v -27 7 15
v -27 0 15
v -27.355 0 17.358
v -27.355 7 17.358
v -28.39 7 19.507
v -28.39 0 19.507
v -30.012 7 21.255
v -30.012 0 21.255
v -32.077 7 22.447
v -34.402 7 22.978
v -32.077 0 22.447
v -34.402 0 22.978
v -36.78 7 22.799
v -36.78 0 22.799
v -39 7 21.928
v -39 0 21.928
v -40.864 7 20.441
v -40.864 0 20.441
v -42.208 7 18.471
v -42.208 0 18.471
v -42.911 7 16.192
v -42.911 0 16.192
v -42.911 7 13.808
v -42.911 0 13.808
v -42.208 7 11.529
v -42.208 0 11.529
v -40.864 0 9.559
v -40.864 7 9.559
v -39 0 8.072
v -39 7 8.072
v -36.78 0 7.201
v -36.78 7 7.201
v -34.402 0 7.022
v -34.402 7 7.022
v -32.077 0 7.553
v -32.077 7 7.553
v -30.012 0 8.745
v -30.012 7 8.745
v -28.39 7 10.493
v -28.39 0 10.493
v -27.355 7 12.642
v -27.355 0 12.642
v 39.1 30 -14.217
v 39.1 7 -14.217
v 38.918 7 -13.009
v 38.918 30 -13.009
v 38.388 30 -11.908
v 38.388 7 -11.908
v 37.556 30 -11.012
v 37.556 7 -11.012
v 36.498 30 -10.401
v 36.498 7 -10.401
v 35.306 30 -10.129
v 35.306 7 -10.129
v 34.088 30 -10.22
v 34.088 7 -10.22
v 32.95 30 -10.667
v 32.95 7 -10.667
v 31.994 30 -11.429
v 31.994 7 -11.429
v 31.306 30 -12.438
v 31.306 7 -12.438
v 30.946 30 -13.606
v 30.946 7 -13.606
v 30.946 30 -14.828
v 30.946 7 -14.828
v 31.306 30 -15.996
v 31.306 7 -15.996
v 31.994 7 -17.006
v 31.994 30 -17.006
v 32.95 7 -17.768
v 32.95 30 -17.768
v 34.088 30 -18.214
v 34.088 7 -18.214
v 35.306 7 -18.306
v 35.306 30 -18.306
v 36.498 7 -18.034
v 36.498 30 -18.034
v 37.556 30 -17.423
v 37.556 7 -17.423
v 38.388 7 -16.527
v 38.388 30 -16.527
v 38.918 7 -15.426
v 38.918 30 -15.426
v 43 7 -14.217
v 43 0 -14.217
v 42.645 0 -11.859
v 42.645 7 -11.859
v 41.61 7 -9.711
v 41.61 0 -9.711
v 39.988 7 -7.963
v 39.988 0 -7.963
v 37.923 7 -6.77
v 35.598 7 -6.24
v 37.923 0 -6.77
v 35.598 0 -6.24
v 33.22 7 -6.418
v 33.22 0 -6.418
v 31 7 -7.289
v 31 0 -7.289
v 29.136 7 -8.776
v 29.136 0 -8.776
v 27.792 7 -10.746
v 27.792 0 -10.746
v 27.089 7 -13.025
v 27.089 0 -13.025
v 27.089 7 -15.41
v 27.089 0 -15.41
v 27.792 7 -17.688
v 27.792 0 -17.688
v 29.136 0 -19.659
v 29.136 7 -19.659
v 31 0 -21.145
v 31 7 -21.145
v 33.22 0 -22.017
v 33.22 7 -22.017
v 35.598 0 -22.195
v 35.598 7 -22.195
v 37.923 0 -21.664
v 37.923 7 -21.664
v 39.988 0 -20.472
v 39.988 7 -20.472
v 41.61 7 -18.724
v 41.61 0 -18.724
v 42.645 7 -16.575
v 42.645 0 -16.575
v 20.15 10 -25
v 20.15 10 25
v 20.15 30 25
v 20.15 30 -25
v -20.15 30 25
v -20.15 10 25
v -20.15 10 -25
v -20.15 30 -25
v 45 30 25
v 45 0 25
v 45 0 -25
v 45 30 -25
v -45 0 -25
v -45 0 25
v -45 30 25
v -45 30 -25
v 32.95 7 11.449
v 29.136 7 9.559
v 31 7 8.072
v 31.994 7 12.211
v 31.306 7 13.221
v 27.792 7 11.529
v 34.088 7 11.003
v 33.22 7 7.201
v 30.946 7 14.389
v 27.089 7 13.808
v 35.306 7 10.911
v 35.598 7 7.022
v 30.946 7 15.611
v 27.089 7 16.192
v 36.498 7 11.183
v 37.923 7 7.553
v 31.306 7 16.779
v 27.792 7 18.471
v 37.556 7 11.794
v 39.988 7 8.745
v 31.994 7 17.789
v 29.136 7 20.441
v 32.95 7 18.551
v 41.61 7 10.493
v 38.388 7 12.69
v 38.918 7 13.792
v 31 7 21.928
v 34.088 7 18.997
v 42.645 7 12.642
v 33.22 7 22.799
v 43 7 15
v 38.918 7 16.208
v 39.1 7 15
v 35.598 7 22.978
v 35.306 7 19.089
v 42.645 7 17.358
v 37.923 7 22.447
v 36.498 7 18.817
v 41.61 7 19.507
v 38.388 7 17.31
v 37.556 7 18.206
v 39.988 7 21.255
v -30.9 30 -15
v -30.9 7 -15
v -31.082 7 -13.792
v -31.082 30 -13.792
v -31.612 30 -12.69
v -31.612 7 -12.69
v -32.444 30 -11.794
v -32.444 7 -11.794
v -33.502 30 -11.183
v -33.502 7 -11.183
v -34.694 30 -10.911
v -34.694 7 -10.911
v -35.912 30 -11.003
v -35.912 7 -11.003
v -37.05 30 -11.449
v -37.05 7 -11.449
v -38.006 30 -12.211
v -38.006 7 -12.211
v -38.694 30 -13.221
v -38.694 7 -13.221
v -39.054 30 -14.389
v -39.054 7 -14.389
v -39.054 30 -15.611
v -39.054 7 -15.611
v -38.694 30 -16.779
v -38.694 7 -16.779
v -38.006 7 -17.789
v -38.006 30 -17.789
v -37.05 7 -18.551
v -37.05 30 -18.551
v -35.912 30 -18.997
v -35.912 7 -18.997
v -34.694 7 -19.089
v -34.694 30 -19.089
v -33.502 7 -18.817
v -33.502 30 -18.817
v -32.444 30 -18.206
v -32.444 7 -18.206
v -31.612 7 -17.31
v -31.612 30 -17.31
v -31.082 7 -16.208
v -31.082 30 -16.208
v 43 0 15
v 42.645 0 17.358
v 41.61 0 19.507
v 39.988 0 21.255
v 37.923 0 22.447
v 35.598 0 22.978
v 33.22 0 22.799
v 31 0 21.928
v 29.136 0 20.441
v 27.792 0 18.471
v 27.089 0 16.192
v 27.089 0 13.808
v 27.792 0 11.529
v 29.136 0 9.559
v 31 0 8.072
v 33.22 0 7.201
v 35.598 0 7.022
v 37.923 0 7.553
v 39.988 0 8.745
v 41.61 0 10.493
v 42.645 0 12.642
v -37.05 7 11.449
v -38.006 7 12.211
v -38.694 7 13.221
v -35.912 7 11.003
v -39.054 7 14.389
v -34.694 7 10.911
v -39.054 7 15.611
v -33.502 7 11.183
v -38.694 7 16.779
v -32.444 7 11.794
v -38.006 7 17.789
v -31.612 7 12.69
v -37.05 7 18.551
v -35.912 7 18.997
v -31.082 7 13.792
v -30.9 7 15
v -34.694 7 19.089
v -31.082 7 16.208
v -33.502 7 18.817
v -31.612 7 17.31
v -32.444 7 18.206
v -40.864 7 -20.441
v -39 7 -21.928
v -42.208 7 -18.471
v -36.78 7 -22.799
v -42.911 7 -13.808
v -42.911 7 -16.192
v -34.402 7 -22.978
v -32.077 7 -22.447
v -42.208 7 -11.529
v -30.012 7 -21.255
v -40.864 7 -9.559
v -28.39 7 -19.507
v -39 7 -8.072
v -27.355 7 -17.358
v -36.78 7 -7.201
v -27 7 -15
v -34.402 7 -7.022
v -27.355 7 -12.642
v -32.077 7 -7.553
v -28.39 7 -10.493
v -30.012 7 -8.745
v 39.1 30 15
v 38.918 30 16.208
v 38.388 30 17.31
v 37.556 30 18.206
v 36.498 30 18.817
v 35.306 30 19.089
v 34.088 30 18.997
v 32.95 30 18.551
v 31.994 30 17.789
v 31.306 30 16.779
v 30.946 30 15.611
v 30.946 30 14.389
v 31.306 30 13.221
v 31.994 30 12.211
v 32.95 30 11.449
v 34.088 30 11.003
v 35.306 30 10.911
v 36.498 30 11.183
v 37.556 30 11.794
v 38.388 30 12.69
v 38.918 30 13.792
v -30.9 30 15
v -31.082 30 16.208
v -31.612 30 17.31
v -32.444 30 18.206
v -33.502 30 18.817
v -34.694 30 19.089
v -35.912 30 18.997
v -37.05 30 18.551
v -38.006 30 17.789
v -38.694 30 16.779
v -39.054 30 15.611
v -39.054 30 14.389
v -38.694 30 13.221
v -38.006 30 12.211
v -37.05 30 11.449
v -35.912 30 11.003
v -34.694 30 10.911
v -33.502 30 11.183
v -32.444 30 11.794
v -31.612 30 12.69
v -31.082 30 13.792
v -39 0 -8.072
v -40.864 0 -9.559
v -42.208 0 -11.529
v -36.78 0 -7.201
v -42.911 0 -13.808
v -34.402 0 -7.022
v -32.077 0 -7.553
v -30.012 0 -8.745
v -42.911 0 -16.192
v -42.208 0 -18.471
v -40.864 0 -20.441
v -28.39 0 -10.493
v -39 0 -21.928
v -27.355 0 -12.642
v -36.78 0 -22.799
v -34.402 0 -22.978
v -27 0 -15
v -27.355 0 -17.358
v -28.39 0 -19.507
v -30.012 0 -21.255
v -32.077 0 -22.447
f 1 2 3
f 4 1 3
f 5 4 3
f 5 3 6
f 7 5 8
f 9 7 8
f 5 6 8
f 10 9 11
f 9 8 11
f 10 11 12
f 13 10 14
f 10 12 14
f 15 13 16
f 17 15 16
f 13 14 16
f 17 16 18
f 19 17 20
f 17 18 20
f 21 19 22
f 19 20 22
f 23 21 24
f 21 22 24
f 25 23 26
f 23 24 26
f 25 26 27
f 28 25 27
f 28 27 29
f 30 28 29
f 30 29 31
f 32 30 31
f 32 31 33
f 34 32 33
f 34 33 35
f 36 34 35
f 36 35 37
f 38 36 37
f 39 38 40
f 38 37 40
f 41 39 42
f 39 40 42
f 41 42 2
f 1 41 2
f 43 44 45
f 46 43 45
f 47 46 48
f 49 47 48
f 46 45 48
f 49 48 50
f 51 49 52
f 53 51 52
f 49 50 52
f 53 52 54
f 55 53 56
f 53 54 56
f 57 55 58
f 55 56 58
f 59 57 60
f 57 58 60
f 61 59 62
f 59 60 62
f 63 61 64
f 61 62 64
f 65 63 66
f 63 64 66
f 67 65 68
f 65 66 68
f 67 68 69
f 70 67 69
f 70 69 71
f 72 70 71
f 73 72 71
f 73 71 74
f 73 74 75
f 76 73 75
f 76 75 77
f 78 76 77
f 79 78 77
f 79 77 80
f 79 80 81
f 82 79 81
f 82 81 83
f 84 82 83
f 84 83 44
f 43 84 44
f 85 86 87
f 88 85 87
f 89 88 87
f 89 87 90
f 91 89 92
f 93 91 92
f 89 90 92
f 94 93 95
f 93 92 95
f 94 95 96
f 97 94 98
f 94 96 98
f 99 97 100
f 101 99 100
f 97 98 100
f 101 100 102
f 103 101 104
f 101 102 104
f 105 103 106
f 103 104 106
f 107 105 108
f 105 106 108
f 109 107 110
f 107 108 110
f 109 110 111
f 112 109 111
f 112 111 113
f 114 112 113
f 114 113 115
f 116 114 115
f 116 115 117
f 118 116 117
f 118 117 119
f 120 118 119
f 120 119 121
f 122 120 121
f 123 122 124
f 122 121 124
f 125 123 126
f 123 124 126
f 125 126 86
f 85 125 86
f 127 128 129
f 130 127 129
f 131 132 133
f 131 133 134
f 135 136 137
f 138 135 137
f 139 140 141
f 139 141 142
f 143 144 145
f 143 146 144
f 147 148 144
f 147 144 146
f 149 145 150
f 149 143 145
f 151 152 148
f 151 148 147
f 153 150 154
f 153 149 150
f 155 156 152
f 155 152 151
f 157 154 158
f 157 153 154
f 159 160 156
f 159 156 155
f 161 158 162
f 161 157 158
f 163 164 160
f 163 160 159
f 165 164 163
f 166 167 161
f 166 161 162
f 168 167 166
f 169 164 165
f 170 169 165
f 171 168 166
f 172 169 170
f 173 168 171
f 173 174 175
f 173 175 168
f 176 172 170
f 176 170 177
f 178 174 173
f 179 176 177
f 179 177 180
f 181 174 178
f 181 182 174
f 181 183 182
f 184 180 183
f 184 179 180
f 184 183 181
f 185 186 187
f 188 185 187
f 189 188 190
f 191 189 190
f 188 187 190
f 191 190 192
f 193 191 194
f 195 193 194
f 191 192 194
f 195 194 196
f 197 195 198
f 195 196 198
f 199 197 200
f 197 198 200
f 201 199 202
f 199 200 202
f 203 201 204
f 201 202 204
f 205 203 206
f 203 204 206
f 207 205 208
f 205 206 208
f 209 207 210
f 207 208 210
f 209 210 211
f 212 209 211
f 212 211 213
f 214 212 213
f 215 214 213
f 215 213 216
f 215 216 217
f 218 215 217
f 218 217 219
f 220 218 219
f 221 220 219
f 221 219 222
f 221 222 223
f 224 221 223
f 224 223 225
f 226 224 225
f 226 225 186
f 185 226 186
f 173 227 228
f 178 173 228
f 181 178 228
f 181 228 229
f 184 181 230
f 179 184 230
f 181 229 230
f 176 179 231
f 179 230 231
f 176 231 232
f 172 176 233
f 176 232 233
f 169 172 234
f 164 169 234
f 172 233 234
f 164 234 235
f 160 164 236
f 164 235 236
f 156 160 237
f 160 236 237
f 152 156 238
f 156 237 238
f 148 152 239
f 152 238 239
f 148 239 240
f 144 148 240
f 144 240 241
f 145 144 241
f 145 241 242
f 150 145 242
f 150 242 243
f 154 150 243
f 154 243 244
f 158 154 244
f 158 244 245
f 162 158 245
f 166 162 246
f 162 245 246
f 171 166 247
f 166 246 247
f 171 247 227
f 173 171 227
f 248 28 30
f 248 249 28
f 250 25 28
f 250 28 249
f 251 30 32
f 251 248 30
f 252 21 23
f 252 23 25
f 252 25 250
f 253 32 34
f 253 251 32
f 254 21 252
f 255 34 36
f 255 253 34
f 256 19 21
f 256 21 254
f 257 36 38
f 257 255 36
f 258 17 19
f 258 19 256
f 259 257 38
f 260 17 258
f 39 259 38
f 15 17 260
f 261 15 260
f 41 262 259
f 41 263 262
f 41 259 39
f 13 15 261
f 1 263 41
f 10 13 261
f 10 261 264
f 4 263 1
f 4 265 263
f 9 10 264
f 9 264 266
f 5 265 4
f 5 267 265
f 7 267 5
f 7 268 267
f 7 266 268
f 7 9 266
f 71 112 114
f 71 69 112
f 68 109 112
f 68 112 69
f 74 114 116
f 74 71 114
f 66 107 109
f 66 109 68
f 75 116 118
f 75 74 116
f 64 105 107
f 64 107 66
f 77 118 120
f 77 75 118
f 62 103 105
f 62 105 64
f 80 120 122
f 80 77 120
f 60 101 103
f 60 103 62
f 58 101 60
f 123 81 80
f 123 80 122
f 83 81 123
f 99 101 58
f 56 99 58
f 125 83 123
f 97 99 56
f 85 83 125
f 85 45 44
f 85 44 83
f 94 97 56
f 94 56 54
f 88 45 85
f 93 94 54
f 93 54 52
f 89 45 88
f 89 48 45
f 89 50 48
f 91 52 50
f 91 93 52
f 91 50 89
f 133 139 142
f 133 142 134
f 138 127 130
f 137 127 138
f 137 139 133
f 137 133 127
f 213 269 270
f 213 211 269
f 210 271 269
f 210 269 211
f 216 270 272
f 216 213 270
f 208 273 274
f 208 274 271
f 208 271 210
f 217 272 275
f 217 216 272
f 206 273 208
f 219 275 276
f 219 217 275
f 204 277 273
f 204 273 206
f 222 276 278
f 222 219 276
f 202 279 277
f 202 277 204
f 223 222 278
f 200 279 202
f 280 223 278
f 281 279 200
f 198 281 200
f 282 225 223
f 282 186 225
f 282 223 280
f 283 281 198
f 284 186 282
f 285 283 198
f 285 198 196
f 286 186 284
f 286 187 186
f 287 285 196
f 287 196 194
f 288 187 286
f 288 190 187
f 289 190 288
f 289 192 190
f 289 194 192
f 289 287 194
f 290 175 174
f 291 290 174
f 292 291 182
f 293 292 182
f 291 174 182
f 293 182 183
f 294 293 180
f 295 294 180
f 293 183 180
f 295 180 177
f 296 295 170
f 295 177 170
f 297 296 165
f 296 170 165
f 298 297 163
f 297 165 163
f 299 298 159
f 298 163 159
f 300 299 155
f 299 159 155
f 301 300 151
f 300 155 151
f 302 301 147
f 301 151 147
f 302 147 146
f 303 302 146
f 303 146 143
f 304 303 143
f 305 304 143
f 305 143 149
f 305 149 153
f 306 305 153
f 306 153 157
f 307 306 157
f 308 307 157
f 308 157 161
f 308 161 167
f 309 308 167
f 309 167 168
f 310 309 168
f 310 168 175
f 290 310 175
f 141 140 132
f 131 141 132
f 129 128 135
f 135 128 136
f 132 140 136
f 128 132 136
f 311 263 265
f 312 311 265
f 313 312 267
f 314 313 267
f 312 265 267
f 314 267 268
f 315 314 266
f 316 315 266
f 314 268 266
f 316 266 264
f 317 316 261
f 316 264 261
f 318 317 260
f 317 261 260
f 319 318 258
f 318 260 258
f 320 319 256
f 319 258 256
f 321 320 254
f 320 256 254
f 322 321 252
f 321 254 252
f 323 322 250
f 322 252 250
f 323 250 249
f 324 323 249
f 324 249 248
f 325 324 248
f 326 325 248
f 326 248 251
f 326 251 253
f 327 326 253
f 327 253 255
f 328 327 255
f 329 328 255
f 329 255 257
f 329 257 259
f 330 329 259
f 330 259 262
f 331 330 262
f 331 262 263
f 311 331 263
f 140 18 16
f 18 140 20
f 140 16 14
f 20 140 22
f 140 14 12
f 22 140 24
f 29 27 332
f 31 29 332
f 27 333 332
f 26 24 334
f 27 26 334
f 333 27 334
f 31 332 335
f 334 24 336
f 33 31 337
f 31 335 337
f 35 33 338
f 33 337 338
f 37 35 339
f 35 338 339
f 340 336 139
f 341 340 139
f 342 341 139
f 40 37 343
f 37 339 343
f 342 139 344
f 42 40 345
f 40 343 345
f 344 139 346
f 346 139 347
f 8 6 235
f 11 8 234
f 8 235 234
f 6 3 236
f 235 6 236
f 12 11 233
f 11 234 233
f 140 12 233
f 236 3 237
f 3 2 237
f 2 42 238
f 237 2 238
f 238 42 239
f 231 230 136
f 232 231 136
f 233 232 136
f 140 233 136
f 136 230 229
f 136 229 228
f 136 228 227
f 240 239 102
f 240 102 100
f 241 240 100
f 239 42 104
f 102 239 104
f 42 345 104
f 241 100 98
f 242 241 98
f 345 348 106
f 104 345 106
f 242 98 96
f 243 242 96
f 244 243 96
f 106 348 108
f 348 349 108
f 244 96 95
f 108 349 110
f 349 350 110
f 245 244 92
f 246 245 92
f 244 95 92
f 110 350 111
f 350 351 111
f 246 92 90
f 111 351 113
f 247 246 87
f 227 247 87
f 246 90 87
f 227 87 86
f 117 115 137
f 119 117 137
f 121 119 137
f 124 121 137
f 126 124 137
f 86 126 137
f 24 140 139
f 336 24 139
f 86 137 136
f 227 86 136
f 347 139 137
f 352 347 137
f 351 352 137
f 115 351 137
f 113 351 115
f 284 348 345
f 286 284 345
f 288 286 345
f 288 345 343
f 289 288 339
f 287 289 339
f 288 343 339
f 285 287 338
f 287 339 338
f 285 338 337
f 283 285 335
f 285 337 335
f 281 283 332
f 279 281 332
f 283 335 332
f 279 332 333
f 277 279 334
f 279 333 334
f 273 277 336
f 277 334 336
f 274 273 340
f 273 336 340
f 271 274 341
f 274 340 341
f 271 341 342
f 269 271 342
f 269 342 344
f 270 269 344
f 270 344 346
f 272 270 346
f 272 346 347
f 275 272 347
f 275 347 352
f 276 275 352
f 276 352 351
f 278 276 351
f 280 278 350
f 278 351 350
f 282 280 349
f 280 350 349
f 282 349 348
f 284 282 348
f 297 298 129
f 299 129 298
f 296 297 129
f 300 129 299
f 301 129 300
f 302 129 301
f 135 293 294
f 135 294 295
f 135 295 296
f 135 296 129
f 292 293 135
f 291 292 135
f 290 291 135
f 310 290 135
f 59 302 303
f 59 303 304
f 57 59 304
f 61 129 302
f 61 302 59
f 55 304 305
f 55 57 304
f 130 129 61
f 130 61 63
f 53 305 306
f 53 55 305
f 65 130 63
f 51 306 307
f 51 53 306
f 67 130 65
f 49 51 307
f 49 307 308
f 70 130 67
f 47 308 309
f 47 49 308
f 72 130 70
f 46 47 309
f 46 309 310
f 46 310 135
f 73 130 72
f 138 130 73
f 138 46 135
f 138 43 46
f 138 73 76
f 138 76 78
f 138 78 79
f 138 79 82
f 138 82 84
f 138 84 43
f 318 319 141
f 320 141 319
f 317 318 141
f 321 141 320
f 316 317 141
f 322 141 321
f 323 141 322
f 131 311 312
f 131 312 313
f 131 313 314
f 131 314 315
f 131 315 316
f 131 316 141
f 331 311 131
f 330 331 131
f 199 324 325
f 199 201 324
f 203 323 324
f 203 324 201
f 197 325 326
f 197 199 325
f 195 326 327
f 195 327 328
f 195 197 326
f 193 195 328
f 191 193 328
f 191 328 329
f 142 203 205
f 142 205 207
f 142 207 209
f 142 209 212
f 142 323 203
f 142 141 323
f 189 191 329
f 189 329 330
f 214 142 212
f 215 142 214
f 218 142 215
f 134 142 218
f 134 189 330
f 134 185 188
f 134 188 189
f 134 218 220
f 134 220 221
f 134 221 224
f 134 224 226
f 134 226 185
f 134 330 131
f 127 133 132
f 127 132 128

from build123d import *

# Parameters (mm, degrees)
SKETCH1_W           = 90
SKETCH1_H           = 50
BOSS_EXTRUDE1_DEPTH = 30
SKETCH2_W           = 40.3
SKETCH2_H           = 40
CUT_EXTRUDE1_DEPTH  = 51
SKETCH3_R           = 4.1
CUT_EXTRUDE2_DEPTH  = 31
SKETCH4_R           = 8
CUT_EXTRUDE3_DEPTH  = 7


with BuildPart() as part:
    # Sketch1 → Boss-Extrude1 (new body)
    with BuildSketch(Plane(origin=(0, 0, 0), x_dir=(1, 0, 0), z_dir=(0, 1, 0))):
        Rectangle(SKETCH1_W, SKETCH1_H)
    extrude(amount=BOSS_EXTRUDE1_DEPTH)

    # Sketch2 → Cut-Extrude1 (cut, through all)
    with BuildSketch(Plane.XY.offset(25)):
        with Locations((0, 30)):
            Rectangle(SKETCH2_W, SKETCH2_H)
    extrude(amount=-CUT_EXTRUDE1_DEPTH, mode=Mode.SUBTRACT)

    # Sketch3 → Cut-Extrude2 (cut, through all)
    with BuildSketch(Plane.XZ):
        with Locations((-35, 15)):
            Circle(SKETCH3_R)
        with Locations((-35, -15)):
            Circle(SKETCH3_R)
        with Locations((35, -14.217273236)):
            Circle(SKETCH3_R)
        with Locations((35, 15)):
            Circle(SKETCH3_R)
    extrude(amount=-CUT_EXTRUDE2_DEPTH, mode=Mode.SUBTRACT)

    # Sketch4 → Cut-Extrude3 (cut)
    with BuildSketch(Plane.XZ):
        with Locations((35, 15)):
            Circle(SKETCH4_R)
        with Locations((35, -14.217273236)):
            Circle(SKETCH4_R)
        with Locations((-35, 15)):
            Circle(SKETCH4_R)
        with Locations((-35, -15)):
            Circle(SKETCH4_R)
    extrude(amount=-CUT_EXTRUDE3_DEPTH, mode=Mode.SUBTRACT)


solid = part.part
